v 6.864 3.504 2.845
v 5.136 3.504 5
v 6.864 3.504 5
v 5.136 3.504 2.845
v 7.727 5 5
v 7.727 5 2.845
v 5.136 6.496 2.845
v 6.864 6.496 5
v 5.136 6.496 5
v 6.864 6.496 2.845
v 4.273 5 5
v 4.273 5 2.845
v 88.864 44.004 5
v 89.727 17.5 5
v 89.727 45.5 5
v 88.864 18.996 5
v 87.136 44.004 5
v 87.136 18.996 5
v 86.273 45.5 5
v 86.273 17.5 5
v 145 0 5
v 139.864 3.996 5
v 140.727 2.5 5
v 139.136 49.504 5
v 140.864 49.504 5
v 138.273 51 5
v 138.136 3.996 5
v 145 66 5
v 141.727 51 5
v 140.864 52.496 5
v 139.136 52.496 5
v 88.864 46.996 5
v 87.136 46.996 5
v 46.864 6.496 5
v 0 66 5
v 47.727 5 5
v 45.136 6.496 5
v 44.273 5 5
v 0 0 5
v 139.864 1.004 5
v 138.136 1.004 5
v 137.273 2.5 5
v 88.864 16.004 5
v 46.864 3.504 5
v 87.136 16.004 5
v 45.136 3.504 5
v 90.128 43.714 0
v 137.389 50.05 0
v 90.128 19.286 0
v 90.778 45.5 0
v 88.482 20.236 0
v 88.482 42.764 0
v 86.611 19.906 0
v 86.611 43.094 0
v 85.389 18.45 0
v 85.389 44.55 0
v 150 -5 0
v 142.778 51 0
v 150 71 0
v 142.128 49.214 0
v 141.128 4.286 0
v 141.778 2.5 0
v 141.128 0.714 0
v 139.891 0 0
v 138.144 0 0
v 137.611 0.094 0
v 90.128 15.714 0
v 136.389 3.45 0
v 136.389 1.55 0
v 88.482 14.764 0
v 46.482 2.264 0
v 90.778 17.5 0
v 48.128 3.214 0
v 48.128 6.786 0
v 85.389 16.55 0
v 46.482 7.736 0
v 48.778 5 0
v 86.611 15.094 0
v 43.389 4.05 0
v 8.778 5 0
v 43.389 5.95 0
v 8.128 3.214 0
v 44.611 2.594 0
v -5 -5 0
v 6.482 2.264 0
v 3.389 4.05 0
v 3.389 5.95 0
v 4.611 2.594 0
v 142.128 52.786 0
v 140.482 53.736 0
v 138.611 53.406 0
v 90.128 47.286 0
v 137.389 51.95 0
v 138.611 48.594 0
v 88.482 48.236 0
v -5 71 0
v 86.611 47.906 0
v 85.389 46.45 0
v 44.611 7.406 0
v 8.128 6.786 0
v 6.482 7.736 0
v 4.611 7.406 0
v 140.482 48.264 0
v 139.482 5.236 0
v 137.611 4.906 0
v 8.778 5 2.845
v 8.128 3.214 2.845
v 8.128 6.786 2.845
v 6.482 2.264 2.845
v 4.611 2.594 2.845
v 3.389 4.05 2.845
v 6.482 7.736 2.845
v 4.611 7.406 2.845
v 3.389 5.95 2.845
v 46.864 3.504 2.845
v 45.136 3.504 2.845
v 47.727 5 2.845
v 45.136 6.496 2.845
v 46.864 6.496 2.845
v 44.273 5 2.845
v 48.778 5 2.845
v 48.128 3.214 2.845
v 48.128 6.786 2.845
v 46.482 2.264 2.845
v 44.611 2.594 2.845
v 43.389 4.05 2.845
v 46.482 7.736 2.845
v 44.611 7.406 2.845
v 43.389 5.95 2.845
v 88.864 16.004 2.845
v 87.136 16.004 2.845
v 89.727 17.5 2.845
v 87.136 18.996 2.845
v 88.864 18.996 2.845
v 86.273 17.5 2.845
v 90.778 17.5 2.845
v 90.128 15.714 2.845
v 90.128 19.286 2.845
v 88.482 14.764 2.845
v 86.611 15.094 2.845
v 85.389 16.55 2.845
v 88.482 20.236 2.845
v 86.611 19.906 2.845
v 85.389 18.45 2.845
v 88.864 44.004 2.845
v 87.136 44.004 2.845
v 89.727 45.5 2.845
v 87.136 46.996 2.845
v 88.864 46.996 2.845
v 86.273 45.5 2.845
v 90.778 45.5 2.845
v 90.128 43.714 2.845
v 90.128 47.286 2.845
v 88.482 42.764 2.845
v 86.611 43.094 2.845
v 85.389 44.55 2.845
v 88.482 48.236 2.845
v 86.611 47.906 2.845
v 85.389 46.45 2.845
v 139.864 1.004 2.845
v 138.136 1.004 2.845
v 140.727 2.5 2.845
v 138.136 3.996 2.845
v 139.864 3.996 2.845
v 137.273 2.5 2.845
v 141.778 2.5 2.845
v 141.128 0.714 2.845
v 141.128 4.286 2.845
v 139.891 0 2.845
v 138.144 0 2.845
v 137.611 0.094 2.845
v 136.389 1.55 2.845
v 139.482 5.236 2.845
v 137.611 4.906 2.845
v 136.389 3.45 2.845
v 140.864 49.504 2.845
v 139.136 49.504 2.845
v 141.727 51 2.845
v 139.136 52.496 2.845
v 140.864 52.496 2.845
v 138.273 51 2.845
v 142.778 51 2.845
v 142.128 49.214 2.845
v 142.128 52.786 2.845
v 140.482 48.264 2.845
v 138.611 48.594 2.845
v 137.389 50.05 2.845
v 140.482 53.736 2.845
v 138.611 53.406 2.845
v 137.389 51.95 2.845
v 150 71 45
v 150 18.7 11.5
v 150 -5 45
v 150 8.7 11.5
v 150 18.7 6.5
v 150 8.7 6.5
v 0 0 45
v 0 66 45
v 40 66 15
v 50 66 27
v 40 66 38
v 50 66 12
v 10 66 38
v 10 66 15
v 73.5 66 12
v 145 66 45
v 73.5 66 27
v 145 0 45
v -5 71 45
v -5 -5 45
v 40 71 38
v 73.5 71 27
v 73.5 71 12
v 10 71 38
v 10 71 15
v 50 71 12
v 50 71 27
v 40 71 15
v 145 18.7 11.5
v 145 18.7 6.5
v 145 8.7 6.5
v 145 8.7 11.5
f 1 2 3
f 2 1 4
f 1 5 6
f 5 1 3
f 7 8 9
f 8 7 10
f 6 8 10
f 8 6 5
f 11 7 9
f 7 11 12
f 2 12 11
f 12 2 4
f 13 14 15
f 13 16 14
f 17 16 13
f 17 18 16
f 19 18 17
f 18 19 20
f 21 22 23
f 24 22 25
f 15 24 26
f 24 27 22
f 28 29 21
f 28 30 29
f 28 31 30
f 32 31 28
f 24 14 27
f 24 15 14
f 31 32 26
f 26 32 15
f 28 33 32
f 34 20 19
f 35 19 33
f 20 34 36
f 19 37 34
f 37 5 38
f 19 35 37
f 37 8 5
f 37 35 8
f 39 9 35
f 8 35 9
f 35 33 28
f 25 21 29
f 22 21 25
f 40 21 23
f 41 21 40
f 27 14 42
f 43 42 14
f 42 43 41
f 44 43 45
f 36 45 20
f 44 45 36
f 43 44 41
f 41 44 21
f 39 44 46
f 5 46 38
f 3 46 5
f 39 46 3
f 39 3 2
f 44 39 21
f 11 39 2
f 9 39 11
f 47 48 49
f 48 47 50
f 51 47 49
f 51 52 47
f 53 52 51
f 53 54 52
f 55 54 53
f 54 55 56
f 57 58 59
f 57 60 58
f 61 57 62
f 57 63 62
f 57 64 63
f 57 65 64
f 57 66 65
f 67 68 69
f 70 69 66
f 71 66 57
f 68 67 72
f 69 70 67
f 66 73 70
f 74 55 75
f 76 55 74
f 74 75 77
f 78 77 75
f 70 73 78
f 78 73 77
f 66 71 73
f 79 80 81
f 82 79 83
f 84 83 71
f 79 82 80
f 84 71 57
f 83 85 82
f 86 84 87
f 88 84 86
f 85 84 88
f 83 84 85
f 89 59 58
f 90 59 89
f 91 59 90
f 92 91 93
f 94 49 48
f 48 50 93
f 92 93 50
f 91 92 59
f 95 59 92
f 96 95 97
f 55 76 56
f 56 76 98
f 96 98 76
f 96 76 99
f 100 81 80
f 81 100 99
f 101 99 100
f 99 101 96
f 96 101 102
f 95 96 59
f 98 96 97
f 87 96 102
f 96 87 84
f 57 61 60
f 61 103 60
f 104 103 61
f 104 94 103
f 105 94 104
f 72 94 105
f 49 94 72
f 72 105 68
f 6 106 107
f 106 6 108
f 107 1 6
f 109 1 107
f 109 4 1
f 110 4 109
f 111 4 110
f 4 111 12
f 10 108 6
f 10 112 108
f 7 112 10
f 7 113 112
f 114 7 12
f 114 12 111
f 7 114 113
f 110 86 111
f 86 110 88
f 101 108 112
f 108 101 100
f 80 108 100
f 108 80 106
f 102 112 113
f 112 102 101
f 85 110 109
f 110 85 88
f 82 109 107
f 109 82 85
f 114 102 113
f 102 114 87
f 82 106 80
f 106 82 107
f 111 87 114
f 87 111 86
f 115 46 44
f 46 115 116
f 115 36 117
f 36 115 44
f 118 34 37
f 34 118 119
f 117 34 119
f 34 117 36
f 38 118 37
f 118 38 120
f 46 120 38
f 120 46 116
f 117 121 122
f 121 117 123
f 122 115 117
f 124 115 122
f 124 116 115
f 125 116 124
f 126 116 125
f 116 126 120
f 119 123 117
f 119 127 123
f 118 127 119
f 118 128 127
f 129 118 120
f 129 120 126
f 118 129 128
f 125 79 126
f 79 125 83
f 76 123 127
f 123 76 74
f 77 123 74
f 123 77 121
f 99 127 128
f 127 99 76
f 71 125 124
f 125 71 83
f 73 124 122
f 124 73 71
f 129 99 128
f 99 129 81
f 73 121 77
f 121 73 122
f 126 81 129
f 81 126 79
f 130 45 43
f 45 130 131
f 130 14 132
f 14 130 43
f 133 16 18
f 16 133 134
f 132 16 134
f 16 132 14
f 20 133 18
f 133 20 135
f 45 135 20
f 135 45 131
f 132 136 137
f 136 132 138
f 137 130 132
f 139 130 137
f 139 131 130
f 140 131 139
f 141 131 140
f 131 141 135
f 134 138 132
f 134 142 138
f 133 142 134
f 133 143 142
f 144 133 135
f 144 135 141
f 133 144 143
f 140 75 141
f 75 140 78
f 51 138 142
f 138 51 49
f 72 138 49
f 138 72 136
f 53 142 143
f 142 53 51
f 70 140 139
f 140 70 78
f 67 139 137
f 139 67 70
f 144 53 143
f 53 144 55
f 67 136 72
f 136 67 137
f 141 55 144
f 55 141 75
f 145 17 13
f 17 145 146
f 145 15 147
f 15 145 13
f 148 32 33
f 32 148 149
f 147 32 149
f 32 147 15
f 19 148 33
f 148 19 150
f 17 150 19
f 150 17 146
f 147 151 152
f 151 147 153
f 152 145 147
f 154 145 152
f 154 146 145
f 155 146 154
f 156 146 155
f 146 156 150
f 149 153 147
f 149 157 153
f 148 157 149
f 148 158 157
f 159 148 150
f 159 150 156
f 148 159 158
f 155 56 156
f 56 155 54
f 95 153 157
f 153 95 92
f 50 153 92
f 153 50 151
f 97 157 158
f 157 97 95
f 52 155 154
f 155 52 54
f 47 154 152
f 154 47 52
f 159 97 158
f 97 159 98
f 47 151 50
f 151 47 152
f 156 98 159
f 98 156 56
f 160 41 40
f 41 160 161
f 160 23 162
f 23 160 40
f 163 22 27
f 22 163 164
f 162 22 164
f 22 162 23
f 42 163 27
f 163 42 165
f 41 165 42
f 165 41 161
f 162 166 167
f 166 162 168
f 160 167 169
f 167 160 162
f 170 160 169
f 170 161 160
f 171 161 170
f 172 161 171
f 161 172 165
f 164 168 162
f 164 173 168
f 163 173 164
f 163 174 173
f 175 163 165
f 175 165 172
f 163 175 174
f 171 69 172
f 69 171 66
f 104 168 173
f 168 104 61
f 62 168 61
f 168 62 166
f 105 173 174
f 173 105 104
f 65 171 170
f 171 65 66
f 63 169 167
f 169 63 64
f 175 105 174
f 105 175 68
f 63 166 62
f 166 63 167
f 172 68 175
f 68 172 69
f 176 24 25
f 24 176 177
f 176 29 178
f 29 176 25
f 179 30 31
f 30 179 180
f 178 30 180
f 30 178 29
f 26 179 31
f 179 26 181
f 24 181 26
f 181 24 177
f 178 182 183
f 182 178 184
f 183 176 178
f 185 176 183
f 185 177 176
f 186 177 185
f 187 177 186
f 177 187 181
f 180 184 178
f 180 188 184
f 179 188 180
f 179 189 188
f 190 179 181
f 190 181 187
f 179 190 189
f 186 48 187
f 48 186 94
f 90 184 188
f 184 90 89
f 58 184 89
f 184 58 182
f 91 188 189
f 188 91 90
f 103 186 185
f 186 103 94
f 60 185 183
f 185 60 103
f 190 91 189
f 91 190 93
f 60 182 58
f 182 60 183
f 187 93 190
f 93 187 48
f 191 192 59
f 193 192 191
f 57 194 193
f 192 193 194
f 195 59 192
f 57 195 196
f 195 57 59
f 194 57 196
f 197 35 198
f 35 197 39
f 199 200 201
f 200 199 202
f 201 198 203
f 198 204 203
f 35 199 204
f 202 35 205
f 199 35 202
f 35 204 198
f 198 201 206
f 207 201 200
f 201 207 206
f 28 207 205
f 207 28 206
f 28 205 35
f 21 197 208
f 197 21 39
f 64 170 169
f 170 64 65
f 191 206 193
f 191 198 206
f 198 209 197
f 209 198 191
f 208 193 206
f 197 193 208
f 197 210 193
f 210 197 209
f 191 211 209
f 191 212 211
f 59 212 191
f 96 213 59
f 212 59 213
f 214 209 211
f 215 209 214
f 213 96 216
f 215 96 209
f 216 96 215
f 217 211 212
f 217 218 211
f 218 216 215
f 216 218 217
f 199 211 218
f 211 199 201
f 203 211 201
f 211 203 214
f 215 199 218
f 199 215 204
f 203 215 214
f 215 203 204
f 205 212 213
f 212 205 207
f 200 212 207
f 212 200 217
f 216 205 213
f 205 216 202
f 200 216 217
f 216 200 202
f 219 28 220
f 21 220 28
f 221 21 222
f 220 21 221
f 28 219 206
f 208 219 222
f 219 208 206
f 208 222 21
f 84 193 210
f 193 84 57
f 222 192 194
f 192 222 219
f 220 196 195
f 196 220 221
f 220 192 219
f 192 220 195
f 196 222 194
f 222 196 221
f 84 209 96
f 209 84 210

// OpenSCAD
baseHeight =5;

wallHeight = 45;

baseWidth = 61;

baseLength = 150;

gapz = 5;
gapy = 22;

shft=5; // shift holes away from y = 0 this amount 

module fourForty ()   // countersunk no 4-40 bolt
{
cylinder(r = (0.136*25.4/2), h = baseHeight);
cylinder(r=(0.21875*25.4/2), h = (0.112*25.4));
} // number 4-40 hex socket head cap screw coutersink

difference(){

cube([baseLength,baseWidth+shft,baseHeight],center=false);

translate([6,shft,0]) {fourForty();}


translate([46,shft,0]) {fourForty();}


translate([88,12.5+shft,0]) {fourForty();}


translate([88,40.5+shft,0]) {fourForty();}


translate([139,2.5,0]) {fourForty();}




translate([140,46+shft,0]) {fourForty();}




}

translate([0,-baseHeight,0]){
cube([baseLength,baseHeight,wallHeight],center=false);
}

difference(){ // cutouts for wallplug and switch

translate([0,baseHeight+baseWidth,0]){
cube([baseLength,baseHeight,wallHeight],center=false);
}

translate([10,baseHeight+baseWidth,10+baseHeight]){
cube([30,baseHeight,23],center=false);
}

translate([50,baseHeight+baseWidth,7+baseHeight]){

cube([23.5,baseHeight,15],center=false);
}

}

translate([-baseHeight,-baseHeight,0]){
cube([baseHeight,baseWidth+3*baseHeight,wallHeight],center=false);
}

difference(){

translate([-baseHeight+baseLength,-baseHeight,0]){
cube([baseHeight,baseWidth+3*baseHeight,wallHeight],center=false);
}

translate([-baseHeight+baseLength,-baseHeight+8.7+shft,6.5]){
cube([baseHeight,10,gapz],center=false);
}

}
